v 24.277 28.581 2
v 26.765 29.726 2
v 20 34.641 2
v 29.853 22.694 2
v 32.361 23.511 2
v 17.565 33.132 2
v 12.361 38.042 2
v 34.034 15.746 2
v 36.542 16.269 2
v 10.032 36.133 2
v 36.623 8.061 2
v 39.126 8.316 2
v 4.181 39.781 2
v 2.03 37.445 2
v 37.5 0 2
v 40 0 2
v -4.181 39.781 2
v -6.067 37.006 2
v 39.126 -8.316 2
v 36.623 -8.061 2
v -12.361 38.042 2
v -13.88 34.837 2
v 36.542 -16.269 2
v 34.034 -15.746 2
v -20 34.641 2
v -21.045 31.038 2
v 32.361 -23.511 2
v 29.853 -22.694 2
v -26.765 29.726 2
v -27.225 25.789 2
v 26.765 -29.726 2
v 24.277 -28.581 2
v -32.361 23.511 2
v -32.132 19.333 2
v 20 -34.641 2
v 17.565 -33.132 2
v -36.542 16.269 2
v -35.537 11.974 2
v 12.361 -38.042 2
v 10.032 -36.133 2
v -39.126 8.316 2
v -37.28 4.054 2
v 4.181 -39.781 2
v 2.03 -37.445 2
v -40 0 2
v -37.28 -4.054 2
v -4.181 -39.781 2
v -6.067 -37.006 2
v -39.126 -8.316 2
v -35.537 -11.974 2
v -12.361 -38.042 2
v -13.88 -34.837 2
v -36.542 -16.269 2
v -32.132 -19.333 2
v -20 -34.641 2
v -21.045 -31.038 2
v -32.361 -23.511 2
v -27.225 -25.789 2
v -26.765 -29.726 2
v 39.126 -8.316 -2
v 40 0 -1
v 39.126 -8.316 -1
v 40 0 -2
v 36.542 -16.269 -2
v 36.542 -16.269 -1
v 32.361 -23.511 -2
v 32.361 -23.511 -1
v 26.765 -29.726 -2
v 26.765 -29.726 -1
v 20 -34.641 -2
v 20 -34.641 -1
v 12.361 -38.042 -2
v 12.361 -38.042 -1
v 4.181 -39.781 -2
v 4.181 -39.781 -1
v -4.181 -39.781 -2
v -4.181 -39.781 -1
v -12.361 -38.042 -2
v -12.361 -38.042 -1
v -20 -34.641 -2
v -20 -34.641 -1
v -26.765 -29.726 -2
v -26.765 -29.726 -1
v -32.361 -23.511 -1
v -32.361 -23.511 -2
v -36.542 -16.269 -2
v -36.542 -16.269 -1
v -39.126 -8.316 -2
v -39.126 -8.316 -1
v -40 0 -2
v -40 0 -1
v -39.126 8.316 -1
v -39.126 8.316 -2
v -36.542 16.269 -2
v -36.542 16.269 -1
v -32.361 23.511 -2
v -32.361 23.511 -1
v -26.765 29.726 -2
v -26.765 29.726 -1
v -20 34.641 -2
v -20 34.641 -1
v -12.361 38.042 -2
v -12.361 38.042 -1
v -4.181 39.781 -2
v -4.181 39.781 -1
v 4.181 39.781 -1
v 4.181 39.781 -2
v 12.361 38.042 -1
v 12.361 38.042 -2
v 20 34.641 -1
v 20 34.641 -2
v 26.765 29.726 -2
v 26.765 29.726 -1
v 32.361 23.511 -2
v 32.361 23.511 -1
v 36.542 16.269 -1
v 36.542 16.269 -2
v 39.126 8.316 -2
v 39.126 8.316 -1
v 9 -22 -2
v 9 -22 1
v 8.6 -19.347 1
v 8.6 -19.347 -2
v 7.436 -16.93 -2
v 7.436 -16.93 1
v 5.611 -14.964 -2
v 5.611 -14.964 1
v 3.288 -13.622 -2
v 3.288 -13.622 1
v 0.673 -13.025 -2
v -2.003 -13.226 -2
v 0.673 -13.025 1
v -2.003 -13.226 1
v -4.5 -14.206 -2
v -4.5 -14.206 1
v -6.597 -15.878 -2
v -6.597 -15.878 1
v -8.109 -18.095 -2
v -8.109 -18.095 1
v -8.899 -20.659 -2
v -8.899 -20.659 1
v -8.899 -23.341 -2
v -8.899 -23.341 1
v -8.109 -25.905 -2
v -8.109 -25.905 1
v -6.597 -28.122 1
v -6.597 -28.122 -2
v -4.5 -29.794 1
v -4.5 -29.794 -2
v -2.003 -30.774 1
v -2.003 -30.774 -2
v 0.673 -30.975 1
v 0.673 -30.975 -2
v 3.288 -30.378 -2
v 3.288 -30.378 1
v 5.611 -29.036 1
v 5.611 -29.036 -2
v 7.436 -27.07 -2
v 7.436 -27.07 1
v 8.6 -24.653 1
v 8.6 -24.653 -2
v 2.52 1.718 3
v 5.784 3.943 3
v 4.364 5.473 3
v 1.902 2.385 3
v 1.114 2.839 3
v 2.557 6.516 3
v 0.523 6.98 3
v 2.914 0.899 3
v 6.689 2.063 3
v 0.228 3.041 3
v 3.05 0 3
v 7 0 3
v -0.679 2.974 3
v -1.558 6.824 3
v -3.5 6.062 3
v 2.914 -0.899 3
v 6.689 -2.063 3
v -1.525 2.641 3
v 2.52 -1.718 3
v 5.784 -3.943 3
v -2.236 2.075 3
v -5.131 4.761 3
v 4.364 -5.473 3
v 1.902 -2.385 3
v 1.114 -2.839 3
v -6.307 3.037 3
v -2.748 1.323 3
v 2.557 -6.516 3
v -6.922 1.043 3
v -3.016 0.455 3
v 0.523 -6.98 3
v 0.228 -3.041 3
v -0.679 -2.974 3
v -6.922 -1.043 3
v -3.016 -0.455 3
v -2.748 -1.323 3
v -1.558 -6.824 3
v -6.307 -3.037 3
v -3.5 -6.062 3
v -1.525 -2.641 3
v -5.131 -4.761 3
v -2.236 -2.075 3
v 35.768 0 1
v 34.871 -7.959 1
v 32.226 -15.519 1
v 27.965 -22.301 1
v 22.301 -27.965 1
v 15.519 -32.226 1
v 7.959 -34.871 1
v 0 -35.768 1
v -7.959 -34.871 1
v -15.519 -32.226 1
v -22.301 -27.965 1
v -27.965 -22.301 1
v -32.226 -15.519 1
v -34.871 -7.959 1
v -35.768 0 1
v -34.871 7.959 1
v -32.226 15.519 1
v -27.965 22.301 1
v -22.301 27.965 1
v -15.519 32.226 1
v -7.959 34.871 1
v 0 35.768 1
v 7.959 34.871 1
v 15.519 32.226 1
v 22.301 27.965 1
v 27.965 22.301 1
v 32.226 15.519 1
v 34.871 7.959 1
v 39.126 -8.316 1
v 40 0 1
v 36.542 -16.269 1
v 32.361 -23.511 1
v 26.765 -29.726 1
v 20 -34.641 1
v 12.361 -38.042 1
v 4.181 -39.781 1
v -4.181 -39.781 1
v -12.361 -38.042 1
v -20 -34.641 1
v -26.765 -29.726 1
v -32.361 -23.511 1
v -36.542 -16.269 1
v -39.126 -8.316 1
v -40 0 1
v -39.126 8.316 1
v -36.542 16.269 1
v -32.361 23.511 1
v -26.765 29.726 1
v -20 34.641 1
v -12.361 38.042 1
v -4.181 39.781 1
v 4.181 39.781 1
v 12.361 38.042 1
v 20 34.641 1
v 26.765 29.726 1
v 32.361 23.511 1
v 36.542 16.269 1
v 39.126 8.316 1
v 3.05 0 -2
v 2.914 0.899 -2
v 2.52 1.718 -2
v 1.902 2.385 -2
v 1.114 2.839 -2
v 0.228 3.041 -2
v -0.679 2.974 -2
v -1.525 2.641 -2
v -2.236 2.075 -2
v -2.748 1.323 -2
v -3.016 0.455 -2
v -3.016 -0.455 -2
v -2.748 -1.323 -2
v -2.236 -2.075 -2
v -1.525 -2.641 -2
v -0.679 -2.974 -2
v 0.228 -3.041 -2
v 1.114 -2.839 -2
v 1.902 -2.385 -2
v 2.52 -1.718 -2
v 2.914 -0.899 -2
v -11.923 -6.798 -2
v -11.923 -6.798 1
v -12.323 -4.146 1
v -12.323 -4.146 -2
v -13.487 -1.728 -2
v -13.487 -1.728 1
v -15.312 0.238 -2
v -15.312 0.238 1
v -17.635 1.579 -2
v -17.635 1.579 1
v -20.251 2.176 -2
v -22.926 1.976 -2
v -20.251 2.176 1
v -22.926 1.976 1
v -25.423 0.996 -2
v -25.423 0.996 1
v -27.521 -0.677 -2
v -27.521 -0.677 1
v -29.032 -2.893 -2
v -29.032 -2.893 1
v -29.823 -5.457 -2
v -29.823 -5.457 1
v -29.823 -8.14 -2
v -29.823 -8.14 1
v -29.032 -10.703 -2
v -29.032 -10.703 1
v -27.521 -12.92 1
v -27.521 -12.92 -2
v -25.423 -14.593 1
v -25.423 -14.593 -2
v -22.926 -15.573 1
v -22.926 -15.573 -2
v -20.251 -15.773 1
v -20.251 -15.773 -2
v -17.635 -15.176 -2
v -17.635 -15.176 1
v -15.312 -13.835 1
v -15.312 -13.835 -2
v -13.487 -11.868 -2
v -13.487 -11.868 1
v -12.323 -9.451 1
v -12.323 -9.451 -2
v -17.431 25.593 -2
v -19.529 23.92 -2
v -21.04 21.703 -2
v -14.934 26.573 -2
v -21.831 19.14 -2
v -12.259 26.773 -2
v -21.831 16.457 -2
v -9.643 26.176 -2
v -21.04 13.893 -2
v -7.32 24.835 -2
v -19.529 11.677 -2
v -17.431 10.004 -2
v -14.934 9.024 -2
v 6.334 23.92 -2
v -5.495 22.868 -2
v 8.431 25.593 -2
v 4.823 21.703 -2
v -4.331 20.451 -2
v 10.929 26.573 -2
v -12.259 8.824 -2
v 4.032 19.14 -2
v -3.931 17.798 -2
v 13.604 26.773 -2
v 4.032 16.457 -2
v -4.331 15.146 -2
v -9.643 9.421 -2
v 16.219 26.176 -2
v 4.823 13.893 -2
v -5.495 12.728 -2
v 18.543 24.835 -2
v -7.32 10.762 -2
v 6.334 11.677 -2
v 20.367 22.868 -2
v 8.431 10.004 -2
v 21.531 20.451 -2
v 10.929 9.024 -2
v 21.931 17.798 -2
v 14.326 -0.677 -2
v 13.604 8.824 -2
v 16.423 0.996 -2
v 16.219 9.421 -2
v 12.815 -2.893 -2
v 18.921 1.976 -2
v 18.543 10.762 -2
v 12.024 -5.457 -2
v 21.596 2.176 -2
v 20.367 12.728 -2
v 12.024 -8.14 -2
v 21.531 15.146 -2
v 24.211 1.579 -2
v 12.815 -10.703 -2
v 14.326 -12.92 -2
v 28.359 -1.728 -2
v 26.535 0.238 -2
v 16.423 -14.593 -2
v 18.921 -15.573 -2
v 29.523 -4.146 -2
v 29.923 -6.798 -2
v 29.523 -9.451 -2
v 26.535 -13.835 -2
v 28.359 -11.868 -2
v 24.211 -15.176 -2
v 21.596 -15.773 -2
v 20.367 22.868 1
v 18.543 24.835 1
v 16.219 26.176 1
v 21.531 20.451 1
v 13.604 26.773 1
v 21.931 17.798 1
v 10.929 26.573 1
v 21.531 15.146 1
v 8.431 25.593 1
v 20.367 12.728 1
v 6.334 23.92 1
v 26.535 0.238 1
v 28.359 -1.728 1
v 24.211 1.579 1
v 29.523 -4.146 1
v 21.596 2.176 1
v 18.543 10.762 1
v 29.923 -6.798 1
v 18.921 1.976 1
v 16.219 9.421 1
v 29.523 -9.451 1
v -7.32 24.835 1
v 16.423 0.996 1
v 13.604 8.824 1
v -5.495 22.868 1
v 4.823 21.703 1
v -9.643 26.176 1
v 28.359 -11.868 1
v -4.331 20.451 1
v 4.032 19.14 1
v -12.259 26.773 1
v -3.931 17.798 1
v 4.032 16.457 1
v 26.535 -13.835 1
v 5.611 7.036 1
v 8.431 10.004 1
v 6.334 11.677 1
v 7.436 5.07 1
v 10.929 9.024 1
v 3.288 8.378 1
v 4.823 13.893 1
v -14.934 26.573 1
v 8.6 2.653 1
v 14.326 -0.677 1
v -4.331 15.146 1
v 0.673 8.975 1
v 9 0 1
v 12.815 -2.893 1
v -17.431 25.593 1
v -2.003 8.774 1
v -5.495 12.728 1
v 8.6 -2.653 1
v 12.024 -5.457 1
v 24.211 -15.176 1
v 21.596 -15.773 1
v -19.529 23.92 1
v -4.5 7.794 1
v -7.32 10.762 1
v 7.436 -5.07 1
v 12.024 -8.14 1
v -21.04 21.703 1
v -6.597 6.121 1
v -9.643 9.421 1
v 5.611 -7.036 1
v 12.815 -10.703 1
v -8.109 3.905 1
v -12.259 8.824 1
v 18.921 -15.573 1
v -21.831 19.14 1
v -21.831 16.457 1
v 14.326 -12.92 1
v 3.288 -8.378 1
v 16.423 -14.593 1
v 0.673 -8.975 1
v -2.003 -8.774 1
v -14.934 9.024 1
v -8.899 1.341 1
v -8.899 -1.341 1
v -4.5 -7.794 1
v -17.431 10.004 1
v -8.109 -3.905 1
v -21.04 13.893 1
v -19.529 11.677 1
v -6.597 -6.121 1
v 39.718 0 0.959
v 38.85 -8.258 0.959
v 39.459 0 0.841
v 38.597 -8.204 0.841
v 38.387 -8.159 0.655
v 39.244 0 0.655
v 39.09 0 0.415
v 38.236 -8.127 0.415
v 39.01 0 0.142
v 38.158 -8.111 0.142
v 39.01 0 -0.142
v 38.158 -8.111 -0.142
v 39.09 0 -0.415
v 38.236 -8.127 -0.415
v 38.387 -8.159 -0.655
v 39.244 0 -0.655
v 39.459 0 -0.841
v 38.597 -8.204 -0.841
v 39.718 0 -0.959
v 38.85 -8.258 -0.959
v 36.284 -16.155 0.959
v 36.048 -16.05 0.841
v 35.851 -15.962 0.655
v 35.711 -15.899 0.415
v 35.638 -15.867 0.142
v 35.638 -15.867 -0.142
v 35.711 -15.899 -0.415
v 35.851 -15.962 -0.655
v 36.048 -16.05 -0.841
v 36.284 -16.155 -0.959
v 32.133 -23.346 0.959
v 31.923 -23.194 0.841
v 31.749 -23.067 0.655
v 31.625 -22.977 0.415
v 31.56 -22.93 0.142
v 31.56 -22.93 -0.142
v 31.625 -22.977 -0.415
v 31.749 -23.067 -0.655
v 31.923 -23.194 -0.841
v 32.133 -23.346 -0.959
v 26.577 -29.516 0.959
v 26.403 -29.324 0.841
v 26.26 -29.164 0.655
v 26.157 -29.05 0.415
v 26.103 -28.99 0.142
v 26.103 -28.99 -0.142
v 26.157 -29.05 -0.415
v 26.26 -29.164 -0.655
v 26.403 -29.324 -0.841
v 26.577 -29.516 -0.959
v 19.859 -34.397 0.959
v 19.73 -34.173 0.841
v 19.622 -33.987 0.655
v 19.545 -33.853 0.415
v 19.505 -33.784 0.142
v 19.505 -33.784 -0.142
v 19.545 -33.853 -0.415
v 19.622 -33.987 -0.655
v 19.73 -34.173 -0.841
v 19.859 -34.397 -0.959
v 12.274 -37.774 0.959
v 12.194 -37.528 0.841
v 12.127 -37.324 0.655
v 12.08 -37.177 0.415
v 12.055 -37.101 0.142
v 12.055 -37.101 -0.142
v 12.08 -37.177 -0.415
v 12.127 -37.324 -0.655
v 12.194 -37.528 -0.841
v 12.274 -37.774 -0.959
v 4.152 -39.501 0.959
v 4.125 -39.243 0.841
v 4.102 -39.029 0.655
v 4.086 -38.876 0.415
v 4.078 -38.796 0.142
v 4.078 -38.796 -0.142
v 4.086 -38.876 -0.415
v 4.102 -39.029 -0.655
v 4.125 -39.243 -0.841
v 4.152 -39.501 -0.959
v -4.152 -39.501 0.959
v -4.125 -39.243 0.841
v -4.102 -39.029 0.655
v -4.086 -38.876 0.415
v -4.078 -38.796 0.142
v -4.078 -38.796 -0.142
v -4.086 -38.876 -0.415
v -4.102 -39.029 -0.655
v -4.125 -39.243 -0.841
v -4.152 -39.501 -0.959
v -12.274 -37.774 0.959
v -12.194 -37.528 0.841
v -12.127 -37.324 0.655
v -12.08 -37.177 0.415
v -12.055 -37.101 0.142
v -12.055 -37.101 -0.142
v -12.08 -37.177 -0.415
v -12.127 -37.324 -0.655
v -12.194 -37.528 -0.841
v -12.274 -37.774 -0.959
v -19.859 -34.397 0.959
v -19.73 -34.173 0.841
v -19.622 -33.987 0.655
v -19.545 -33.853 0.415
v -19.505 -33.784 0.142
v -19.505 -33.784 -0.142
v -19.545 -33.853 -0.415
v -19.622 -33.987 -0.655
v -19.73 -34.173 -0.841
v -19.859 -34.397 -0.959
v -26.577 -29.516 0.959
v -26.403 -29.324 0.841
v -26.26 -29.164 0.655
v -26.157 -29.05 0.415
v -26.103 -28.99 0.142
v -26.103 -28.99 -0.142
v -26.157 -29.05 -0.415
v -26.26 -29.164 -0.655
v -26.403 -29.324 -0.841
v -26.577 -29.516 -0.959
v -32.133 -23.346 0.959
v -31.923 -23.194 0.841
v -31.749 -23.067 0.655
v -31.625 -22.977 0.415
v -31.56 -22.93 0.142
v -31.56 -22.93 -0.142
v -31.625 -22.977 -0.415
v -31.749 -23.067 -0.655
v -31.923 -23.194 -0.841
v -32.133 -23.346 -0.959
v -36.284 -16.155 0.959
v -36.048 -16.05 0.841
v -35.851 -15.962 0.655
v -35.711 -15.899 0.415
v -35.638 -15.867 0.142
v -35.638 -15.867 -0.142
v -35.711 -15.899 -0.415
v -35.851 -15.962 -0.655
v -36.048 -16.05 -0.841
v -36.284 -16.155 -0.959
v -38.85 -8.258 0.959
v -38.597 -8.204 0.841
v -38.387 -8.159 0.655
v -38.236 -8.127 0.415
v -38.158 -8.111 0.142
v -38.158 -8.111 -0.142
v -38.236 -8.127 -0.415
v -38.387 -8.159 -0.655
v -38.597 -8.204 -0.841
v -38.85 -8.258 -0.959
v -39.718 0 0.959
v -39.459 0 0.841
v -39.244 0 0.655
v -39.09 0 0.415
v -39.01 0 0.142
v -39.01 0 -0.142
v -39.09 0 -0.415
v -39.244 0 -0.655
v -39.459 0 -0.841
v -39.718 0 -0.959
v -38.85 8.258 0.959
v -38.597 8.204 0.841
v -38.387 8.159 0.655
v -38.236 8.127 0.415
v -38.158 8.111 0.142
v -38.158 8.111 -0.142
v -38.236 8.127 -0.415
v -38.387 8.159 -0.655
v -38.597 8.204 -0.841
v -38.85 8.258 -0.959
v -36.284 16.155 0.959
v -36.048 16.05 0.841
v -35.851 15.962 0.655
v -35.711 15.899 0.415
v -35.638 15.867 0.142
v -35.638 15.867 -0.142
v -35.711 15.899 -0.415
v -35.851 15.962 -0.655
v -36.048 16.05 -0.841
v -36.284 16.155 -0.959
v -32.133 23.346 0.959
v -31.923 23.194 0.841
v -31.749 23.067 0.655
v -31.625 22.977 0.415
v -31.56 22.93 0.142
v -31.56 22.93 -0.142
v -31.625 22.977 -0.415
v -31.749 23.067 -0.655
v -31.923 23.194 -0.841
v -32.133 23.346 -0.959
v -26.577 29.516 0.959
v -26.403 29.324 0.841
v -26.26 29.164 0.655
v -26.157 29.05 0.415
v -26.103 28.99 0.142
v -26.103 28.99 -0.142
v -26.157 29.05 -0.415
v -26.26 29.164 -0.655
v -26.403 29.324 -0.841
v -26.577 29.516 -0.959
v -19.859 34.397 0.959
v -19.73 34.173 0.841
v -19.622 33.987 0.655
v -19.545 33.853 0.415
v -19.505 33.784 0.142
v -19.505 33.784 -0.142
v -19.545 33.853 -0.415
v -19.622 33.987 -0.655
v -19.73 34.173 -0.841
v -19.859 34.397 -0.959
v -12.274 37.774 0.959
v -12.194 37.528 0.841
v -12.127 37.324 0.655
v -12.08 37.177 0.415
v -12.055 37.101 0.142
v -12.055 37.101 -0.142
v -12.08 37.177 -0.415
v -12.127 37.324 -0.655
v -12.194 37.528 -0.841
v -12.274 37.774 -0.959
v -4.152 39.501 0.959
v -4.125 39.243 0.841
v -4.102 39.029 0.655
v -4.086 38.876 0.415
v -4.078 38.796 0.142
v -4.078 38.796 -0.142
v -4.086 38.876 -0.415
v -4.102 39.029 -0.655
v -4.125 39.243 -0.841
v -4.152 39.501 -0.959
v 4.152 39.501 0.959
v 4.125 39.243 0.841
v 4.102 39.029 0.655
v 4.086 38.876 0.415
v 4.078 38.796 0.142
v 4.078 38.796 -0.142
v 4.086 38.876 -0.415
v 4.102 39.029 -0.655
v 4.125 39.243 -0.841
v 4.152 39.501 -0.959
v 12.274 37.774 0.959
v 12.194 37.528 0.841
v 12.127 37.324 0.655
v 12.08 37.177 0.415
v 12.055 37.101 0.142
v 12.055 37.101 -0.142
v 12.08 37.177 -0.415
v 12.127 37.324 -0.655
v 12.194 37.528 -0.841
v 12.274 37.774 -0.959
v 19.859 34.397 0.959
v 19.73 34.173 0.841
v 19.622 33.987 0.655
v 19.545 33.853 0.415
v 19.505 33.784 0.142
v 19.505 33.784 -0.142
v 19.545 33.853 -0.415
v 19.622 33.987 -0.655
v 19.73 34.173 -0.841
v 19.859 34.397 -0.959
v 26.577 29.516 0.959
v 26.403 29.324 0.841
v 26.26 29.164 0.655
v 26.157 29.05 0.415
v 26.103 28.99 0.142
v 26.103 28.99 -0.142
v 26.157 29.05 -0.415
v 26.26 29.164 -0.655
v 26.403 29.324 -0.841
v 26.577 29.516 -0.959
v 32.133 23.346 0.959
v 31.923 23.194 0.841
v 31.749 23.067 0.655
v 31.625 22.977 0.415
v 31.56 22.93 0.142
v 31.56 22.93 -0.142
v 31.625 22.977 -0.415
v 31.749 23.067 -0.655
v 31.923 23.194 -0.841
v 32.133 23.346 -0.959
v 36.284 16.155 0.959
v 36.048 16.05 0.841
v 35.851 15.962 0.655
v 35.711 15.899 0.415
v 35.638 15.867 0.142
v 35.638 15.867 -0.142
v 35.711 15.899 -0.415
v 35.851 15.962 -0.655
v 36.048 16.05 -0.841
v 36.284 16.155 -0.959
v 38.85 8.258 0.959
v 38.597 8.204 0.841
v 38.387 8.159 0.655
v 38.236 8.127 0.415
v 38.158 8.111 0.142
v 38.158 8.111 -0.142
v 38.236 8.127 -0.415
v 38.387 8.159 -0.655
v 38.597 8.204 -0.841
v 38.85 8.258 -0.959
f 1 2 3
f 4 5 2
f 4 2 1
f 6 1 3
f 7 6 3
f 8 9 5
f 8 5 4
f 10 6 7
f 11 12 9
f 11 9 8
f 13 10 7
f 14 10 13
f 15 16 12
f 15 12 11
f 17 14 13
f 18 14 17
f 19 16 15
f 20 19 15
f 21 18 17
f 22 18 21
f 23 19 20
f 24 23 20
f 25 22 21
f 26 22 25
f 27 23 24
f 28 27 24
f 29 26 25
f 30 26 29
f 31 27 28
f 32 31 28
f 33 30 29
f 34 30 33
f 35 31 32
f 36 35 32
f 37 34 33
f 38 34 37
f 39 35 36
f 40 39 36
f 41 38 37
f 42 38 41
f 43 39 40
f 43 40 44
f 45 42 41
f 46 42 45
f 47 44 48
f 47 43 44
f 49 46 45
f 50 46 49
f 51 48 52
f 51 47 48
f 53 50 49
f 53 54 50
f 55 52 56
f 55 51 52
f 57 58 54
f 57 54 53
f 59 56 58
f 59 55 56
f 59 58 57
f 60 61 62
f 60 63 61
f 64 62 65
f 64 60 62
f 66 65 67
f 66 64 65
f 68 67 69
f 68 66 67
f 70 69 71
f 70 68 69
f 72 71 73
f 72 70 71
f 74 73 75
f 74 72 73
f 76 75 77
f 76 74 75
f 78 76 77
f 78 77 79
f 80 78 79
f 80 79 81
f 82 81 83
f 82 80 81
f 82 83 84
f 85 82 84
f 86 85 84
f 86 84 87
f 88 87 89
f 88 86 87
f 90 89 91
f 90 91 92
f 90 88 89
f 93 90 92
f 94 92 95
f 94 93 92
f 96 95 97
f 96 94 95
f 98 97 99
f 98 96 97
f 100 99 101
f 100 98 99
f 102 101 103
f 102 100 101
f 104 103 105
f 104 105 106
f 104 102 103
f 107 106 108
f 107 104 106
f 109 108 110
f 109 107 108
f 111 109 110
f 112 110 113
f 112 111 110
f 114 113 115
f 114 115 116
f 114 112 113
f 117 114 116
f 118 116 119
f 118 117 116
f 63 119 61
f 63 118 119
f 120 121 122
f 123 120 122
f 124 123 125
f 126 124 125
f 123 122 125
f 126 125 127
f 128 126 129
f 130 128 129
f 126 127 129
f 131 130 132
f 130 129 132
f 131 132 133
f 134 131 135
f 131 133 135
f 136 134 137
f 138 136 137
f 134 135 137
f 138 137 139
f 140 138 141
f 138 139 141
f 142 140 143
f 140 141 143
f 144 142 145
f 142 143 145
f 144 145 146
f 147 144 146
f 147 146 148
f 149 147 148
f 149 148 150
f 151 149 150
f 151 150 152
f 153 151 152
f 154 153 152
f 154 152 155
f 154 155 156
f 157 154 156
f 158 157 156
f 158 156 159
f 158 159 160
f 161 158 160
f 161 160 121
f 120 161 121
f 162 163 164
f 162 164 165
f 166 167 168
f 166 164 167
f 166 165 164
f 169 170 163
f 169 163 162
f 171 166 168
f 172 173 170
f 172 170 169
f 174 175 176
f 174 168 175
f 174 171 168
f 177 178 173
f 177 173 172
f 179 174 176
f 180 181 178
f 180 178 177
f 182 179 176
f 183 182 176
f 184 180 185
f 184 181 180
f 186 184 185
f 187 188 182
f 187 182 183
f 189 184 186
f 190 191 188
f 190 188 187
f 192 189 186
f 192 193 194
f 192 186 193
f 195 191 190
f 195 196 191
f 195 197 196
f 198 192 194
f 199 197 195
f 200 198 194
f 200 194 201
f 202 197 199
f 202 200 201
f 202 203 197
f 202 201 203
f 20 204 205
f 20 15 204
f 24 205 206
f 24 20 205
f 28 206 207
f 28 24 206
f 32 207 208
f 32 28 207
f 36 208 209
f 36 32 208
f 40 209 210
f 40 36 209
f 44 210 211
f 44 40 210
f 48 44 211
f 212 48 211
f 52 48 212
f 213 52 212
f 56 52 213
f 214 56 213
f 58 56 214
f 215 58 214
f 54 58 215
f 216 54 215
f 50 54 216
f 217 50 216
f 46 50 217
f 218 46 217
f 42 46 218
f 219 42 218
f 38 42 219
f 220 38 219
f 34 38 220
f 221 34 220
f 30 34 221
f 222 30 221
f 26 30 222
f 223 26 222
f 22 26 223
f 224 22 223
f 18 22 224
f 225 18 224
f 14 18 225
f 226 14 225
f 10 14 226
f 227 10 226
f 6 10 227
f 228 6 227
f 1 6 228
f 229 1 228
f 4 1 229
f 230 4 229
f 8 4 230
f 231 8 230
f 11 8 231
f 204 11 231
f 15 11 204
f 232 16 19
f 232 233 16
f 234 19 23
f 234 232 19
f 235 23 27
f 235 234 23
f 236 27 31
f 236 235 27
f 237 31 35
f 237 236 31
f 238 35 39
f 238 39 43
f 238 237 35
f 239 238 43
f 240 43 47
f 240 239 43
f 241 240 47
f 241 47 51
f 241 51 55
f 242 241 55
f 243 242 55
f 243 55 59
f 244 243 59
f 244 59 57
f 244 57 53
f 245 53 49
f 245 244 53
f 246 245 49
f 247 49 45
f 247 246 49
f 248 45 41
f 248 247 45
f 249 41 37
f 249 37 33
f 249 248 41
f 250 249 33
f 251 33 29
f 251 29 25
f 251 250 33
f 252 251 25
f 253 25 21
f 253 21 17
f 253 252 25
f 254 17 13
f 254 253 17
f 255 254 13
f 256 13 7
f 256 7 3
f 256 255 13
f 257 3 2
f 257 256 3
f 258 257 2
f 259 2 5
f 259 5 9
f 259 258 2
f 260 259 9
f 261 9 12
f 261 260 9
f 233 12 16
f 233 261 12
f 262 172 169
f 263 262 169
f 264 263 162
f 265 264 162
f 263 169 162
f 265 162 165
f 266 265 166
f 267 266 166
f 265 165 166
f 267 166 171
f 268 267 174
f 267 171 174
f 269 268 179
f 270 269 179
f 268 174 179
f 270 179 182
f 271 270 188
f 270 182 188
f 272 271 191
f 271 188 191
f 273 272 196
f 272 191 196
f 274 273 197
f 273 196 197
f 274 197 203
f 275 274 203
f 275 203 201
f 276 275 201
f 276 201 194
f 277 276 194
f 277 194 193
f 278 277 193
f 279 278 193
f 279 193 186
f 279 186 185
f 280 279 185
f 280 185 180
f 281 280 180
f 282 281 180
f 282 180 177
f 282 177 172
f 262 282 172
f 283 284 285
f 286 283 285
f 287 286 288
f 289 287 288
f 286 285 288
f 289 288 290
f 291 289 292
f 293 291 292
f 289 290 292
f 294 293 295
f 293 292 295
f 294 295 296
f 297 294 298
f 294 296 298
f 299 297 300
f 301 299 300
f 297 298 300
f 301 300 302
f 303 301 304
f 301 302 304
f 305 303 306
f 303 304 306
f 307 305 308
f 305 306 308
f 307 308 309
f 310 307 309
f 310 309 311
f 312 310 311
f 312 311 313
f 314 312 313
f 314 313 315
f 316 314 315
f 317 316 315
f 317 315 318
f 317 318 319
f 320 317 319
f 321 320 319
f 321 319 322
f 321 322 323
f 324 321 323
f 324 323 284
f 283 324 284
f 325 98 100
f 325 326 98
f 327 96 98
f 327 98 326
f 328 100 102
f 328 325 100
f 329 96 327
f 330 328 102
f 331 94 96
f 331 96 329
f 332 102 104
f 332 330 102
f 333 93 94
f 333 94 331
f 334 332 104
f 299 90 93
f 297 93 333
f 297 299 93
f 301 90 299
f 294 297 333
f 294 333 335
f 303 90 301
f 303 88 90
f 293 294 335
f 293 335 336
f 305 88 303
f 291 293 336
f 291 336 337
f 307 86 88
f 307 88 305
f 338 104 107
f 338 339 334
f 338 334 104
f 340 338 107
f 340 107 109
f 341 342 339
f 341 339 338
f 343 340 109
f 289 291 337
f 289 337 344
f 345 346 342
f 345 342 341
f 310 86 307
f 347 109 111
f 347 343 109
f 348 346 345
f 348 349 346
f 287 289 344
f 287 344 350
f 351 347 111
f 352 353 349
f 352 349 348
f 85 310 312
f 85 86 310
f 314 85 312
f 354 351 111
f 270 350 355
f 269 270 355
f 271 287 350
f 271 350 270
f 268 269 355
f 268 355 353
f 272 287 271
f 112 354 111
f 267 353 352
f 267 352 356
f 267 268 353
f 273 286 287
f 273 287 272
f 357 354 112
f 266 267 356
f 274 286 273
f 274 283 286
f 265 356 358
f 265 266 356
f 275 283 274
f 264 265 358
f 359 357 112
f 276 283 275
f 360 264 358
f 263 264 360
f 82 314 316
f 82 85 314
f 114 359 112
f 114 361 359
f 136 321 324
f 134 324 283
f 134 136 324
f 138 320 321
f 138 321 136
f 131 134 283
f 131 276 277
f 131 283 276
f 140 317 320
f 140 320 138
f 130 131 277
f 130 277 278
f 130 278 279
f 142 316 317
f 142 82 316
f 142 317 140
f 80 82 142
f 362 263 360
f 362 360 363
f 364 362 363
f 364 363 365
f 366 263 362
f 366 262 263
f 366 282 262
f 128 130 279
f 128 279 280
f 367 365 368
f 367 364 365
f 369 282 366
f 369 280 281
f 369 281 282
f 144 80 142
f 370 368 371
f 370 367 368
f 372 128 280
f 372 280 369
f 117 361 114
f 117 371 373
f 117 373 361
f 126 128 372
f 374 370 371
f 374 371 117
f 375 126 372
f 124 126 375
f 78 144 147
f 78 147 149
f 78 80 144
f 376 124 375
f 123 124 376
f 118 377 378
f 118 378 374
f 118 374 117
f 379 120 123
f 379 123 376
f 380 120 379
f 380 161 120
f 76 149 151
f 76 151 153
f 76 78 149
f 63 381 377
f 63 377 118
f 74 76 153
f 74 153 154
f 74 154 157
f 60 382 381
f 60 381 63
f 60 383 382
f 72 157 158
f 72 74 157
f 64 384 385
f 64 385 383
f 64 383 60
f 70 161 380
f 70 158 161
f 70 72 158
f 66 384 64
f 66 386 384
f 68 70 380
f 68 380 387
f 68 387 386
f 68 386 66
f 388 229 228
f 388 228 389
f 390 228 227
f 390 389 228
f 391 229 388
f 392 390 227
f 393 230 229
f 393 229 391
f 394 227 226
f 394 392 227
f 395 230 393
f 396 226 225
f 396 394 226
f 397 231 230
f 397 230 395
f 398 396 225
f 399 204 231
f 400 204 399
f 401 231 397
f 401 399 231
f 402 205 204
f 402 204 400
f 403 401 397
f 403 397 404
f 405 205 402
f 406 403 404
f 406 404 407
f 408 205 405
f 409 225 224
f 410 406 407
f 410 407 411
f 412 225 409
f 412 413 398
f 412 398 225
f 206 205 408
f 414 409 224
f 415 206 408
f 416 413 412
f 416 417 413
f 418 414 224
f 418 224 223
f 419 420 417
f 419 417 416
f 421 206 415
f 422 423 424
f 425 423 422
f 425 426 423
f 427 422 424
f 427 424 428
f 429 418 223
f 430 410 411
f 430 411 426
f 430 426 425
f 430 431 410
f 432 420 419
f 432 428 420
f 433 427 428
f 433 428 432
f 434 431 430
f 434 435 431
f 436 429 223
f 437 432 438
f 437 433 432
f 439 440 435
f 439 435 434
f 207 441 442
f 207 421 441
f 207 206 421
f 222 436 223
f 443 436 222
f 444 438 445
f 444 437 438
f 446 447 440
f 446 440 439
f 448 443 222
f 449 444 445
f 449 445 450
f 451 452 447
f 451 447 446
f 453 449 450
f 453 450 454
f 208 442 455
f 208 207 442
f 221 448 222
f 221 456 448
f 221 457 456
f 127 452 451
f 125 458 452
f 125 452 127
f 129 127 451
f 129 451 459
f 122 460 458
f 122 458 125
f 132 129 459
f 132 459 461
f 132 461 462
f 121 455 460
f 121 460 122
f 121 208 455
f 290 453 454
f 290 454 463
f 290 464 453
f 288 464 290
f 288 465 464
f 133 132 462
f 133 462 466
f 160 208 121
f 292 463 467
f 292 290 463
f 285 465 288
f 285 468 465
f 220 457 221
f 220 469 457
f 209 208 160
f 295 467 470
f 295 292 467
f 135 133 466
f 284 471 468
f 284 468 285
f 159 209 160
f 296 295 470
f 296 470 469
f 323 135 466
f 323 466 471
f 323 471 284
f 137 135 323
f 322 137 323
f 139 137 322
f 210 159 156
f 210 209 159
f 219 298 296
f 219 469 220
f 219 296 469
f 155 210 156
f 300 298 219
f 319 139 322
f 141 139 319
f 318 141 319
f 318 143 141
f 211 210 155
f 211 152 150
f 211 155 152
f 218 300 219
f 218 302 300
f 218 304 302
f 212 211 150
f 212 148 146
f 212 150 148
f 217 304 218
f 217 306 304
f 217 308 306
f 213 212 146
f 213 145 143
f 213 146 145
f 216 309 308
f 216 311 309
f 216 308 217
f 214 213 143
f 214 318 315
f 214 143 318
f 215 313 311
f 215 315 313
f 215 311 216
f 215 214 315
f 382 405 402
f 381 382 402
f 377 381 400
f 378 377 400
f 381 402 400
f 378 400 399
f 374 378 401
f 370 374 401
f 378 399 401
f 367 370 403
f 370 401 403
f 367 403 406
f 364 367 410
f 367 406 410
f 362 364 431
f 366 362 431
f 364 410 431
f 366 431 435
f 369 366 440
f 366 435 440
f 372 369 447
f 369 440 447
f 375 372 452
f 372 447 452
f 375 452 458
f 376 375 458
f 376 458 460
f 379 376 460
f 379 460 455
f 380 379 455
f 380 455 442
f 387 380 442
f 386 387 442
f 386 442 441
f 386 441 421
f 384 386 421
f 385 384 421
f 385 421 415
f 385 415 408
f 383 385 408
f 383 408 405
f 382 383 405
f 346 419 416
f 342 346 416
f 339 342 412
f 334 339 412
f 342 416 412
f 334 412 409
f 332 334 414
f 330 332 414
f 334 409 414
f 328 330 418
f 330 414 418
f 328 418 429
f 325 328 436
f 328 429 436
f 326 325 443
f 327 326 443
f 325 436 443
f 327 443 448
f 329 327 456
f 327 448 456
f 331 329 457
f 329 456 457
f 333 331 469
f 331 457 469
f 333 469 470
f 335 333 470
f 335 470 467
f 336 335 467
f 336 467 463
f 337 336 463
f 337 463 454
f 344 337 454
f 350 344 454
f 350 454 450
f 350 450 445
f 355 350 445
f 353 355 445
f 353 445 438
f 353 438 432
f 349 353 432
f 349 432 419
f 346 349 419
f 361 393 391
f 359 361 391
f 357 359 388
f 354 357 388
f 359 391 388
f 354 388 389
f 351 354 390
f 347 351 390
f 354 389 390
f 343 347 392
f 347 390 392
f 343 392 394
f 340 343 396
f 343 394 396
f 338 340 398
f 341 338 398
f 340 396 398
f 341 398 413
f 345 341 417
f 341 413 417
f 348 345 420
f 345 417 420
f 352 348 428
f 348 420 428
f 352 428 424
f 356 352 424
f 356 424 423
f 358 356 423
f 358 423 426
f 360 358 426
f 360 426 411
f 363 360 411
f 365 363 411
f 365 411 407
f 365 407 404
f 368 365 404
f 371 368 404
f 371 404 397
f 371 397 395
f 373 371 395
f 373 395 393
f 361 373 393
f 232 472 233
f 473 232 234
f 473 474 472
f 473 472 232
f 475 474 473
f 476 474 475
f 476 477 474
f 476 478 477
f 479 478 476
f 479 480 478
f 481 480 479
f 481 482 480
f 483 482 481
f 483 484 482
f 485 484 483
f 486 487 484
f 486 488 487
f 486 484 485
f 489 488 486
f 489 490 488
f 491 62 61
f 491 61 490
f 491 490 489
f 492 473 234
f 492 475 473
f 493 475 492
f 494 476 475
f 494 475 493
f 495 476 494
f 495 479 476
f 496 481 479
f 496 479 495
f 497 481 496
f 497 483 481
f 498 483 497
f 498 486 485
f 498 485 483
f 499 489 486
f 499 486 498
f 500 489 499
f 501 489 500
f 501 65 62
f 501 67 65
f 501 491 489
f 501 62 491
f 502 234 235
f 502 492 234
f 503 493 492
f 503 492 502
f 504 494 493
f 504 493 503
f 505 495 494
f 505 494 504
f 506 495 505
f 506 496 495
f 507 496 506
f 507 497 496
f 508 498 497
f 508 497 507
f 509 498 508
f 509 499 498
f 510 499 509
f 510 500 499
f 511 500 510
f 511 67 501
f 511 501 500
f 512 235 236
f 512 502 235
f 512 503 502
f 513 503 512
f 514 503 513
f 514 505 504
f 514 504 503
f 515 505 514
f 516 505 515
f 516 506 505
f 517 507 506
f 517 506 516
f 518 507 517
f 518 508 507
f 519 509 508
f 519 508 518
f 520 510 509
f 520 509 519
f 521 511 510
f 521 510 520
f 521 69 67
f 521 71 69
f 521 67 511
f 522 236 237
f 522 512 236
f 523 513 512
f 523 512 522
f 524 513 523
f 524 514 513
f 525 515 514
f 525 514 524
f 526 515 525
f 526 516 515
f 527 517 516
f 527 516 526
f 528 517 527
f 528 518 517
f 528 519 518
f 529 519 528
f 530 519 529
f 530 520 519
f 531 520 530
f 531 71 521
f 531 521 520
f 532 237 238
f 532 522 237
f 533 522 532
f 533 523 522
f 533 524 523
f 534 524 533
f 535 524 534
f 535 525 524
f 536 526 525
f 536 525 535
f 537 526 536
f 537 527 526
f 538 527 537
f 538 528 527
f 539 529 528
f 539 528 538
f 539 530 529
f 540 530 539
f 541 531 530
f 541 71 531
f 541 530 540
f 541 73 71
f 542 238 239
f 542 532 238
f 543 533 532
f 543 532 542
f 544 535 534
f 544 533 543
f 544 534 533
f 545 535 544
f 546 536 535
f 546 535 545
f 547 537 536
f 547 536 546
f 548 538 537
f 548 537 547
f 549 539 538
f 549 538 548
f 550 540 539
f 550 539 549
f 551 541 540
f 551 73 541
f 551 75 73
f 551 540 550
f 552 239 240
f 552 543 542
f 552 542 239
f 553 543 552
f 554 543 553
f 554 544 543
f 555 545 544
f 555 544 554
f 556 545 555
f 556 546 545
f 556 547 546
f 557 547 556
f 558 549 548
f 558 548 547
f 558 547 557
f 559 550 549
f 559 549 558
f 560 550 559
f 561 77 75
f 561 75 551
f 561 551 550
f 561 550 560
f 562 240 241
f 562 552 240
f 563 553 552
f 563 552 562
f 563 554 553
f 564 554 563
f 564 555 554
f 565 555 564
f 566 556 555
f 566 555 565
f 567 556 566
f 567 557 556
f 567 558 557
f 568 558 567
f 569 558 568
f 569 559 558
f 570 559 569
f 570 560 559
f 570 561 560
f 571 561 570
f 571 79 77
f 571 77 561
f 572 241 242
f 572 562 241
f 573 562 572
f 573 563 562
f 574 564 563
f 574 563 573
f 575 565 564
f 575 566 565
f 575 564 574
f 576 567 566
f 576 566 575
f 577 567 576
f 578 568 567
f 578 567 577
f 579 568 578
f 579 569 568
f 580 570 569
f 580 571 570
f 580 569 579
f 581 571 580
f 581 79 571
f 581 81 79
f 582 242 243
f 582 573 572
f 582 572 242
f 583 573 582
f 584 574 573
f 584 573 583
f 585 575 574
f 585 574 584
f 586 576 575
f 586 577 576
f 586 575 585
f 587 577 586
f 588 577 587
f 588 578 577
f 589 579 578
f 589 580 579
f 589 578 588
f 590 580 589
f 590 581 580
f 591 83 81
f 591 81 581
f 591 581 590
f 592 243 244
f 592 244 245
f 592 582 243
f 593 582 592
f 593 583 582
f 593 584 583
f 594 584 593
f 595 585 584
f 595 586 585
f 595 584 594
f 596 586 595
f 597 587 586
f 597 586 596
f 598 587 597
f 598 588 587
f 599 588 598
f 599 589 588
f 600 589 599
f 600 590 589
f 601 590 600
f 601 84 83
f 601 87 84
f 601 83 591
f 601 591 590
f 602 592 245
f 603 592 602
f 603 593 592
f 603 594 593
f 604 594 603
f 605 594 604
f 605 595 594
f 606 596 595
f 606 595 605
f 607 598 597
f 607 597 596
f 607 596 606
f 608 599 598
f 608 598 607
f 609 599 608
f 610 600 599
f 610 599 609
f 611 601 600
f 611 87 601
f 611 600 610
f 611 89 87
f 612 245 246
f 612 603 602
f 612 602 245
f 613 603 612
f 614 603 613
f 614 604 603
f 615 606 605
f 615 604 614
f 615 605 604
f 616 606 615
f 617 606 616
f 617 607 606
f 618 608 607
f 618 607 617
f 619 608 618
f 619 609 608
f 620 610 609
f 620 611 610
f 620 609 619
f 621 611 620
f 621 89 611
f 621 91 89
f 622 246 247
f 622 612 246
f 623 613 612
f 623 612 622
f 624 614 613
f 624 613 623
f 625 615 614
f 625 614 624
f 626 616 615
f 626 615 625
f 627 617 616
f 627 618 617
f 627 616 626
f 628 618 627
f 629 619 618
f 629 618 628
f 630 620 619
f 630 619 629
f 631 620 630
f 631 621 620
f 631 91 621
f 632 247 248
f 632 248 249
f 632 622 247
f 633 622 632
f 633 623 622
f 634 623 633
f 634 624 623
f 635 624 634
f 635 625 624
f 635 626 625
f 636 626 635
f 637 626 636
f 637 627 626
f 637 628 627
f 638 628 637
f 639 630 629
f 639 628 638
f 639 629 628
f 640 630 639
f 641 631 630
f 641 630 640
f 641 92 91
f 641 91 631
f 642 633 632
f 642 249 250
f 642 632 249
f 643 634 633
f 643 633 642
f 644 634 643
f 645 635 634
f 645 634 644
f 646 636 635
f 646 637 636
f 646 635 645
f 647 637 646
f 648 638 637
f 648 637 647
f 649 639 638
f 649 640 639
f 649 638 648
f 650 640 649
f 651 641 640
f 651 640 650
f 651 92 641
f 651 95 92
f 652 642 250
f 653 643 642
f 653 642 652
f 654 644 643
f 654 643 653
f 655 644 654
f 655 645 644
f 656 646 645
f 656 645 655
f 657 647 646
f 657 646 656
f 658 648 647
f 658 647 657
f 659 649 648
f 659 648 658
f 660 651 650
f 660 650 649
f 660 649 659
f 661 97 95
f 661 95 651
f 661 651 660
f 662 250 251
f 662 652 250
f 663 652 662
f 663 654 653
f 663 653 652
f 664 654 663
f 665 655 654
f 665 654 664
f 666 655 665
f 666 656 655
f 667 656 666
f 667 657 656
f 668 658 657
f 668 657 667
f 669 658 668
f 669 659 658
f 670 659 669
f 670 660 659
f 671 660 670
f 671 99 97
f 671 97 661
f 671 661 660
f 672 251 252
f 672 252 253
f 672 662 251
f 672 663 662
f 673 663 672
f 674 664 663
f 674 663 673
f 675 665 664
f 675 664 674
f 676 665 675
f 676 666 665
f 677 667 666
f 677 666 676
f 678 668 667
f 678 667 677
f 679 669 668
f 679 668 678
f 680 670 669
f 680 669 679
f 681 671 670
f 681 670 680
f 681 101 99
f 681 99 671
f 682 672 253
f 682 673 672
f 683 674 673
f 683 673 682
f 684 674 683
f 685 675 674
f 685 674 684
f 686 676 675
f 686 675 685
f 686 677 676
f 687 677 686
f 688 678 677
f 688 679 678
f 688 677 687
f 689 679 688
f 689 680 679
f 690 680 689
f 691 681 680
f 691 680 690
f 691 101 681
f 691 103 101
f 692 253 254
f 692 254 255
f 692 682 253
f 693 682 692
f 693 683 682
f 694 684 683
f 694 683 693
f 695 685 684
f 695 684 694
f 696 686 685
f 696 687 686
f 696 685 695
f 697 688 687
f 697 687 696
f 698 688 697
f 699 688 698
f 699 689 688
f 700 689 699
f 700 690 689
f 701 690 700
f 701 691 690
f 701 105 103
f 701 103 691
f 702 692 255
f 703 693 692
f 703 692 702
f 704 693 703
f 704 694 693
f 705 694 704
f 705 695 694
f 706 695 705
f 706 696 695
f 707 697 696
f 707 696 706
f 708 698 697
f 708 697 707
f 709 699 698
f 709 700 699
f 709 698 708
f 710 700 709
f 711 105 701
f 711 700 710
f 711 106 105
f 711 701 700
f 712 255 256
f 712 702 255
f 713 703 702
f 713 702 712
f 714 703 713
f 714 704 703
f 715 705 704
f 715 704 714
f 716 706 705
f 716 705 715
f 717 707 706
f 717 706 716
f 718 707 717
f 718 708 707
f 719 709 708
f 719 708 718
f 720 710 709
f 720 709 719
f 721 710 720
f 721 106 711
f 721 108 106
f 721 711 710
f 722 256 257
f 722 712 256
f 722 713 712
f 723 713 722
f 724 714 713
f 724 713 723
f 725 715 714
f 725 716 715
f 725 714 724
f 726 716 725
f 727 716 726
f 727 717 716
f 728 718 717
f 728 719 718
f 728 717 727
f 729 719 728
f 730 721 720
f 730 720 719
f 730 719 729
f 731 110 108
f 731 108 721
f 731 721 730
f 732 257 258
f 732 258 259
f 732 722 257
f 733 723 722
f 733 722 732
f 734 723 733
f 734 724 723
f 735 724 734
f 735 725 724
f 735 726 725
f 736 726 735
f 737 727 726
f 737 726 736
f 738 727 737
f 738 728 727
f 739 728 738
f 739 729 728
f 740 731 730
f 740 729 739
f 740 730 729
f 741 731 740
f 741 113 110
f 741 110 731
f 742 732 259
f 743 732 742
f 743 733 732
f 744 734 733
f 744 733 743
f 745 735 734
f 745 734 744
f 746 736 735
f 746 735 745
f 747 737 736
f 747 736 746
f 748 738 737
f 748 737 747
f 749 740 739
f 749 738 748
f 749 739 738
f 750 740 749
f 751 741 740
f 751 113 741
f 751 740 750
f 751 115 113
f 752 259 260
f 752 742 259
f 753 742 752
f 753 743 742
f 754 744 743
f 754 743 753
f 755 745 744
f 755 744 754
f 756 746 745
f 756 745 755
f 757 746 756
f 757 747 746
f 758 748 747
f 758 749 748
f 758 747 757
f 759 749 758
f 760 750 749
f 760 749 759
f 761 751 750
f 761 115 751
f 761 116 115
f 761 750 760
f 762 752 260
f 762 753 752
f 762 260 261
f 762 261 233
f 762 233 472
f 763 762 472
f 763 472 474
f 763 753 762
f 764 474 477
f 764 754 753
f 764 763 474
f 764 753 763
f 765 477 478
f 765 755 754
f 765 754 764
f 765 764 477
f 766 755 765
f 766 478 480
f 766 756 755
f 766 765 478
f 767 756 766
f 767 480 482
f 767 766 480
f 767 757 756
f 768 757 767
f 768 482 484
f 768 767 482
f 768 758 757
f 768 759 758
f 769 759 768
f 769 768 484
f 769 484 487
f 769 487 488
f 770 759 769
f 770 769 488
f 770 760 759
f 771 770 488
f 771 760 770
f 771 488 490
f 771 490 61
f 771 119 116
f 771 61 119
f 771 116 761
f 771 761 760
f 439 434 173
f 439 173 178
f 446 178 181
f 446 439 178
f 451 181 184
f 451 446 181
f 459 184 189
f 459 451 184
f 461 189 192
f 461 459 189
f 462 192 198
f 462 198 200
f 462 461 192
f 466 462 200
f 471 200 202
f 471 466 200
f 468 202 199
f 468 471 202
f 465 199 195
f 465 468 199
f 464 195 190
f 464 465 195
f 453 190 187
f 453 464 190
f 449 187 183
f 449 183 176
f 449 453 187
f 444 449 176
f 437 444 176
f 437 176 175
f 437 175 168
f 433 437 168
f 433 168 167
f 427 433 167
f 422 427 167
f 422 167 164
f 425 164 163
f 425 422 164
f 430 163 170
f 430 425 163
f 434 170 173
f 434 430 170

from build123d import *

# Parameters (mm, degrees)
SKETCH2_W          = 7
SKETCH2_H          = 1
SKETCH3_R          = 3.05
CUT_EXTRUDE1_DEPTH = 57.789083458
CHAMFER1_SIZE      = 2
SKETCH4_R          = 9
CUT_EXTRUDE2_DEPTH = 57.648036153


with BuildPart() as part:
    # Sketch2 → Revolve1 (revolve)
    with BuildSketch(Plane(origin=(0, 0, 0), x_dir=(1, 0, 0), z_dir=(0, 1, 0))):
        with Locations((3.5, -2.5)):
            Rectangle(SKETCH2_W, SKETCH2_H)
        with BuildLine():
            Line((0, 2), (0, -2))
            Line((0, -2), (7, -2))
            Line((7, -2), (7, -1))
            Line((7, -1), (35.767949192, -1))
            Line((35.767949192, -1), (37.5, -2))
            Line((37.5, -2), (40, -2))
            Line((40, -2), (40, -1))
            ThreePointArc((40, -1), (39, 0), (40, 1))
            Line((40, 1), (40, 2))
            Line((40, 2), (0, 2))
        make_face()
    revolve(axis=Axis((0, 0, 2), (0, 0, -1)))

    # Sketch3 → Cut-Extrude1 (cut, through all)
    with BuildSketch(Plane.XY.offset(3)):
        Circle(SKETCH3_R)
    extrude(amount=-CUT_EXTRUDE1_DEPTH, mode=Mode.SUBTRACT)

    # Chamfer1
    chamfer1_edges = [part.edges().sort_by_distance(p)[0] for p in [
        (-7, 0, 1),
    ]]
    chamfer(chamfer1_edges, length=CHAMFER1_SIZE - 0.0001)  # a hair under: the kernel refuses the full size

    # Sketch4 → Cut-Extrude2 (cut, through all)
    with BuildSketch(Plane.XY.offset(1)):
        with Locations((0, -22)):
            Circle(SKETCH4_R)
        with Locations((-20.923243358, -6.798373876)):
            Circle(SKETCH4_R)
        with Locations((-12.93127555, 17.798373876)):
            Circle(SKETCH4_R)
        with Locations((12.93127555, 17.798373876)):
            Circle(SKETCH4_R)
        with Locations((20.923243358, -6.798373876)):
            Circle(SKETCH4_R)
    extrude(amount=-CUT_EXTRUDE2_DEPTH, mode=Mode.SUBTRACT)


solid = part.part
